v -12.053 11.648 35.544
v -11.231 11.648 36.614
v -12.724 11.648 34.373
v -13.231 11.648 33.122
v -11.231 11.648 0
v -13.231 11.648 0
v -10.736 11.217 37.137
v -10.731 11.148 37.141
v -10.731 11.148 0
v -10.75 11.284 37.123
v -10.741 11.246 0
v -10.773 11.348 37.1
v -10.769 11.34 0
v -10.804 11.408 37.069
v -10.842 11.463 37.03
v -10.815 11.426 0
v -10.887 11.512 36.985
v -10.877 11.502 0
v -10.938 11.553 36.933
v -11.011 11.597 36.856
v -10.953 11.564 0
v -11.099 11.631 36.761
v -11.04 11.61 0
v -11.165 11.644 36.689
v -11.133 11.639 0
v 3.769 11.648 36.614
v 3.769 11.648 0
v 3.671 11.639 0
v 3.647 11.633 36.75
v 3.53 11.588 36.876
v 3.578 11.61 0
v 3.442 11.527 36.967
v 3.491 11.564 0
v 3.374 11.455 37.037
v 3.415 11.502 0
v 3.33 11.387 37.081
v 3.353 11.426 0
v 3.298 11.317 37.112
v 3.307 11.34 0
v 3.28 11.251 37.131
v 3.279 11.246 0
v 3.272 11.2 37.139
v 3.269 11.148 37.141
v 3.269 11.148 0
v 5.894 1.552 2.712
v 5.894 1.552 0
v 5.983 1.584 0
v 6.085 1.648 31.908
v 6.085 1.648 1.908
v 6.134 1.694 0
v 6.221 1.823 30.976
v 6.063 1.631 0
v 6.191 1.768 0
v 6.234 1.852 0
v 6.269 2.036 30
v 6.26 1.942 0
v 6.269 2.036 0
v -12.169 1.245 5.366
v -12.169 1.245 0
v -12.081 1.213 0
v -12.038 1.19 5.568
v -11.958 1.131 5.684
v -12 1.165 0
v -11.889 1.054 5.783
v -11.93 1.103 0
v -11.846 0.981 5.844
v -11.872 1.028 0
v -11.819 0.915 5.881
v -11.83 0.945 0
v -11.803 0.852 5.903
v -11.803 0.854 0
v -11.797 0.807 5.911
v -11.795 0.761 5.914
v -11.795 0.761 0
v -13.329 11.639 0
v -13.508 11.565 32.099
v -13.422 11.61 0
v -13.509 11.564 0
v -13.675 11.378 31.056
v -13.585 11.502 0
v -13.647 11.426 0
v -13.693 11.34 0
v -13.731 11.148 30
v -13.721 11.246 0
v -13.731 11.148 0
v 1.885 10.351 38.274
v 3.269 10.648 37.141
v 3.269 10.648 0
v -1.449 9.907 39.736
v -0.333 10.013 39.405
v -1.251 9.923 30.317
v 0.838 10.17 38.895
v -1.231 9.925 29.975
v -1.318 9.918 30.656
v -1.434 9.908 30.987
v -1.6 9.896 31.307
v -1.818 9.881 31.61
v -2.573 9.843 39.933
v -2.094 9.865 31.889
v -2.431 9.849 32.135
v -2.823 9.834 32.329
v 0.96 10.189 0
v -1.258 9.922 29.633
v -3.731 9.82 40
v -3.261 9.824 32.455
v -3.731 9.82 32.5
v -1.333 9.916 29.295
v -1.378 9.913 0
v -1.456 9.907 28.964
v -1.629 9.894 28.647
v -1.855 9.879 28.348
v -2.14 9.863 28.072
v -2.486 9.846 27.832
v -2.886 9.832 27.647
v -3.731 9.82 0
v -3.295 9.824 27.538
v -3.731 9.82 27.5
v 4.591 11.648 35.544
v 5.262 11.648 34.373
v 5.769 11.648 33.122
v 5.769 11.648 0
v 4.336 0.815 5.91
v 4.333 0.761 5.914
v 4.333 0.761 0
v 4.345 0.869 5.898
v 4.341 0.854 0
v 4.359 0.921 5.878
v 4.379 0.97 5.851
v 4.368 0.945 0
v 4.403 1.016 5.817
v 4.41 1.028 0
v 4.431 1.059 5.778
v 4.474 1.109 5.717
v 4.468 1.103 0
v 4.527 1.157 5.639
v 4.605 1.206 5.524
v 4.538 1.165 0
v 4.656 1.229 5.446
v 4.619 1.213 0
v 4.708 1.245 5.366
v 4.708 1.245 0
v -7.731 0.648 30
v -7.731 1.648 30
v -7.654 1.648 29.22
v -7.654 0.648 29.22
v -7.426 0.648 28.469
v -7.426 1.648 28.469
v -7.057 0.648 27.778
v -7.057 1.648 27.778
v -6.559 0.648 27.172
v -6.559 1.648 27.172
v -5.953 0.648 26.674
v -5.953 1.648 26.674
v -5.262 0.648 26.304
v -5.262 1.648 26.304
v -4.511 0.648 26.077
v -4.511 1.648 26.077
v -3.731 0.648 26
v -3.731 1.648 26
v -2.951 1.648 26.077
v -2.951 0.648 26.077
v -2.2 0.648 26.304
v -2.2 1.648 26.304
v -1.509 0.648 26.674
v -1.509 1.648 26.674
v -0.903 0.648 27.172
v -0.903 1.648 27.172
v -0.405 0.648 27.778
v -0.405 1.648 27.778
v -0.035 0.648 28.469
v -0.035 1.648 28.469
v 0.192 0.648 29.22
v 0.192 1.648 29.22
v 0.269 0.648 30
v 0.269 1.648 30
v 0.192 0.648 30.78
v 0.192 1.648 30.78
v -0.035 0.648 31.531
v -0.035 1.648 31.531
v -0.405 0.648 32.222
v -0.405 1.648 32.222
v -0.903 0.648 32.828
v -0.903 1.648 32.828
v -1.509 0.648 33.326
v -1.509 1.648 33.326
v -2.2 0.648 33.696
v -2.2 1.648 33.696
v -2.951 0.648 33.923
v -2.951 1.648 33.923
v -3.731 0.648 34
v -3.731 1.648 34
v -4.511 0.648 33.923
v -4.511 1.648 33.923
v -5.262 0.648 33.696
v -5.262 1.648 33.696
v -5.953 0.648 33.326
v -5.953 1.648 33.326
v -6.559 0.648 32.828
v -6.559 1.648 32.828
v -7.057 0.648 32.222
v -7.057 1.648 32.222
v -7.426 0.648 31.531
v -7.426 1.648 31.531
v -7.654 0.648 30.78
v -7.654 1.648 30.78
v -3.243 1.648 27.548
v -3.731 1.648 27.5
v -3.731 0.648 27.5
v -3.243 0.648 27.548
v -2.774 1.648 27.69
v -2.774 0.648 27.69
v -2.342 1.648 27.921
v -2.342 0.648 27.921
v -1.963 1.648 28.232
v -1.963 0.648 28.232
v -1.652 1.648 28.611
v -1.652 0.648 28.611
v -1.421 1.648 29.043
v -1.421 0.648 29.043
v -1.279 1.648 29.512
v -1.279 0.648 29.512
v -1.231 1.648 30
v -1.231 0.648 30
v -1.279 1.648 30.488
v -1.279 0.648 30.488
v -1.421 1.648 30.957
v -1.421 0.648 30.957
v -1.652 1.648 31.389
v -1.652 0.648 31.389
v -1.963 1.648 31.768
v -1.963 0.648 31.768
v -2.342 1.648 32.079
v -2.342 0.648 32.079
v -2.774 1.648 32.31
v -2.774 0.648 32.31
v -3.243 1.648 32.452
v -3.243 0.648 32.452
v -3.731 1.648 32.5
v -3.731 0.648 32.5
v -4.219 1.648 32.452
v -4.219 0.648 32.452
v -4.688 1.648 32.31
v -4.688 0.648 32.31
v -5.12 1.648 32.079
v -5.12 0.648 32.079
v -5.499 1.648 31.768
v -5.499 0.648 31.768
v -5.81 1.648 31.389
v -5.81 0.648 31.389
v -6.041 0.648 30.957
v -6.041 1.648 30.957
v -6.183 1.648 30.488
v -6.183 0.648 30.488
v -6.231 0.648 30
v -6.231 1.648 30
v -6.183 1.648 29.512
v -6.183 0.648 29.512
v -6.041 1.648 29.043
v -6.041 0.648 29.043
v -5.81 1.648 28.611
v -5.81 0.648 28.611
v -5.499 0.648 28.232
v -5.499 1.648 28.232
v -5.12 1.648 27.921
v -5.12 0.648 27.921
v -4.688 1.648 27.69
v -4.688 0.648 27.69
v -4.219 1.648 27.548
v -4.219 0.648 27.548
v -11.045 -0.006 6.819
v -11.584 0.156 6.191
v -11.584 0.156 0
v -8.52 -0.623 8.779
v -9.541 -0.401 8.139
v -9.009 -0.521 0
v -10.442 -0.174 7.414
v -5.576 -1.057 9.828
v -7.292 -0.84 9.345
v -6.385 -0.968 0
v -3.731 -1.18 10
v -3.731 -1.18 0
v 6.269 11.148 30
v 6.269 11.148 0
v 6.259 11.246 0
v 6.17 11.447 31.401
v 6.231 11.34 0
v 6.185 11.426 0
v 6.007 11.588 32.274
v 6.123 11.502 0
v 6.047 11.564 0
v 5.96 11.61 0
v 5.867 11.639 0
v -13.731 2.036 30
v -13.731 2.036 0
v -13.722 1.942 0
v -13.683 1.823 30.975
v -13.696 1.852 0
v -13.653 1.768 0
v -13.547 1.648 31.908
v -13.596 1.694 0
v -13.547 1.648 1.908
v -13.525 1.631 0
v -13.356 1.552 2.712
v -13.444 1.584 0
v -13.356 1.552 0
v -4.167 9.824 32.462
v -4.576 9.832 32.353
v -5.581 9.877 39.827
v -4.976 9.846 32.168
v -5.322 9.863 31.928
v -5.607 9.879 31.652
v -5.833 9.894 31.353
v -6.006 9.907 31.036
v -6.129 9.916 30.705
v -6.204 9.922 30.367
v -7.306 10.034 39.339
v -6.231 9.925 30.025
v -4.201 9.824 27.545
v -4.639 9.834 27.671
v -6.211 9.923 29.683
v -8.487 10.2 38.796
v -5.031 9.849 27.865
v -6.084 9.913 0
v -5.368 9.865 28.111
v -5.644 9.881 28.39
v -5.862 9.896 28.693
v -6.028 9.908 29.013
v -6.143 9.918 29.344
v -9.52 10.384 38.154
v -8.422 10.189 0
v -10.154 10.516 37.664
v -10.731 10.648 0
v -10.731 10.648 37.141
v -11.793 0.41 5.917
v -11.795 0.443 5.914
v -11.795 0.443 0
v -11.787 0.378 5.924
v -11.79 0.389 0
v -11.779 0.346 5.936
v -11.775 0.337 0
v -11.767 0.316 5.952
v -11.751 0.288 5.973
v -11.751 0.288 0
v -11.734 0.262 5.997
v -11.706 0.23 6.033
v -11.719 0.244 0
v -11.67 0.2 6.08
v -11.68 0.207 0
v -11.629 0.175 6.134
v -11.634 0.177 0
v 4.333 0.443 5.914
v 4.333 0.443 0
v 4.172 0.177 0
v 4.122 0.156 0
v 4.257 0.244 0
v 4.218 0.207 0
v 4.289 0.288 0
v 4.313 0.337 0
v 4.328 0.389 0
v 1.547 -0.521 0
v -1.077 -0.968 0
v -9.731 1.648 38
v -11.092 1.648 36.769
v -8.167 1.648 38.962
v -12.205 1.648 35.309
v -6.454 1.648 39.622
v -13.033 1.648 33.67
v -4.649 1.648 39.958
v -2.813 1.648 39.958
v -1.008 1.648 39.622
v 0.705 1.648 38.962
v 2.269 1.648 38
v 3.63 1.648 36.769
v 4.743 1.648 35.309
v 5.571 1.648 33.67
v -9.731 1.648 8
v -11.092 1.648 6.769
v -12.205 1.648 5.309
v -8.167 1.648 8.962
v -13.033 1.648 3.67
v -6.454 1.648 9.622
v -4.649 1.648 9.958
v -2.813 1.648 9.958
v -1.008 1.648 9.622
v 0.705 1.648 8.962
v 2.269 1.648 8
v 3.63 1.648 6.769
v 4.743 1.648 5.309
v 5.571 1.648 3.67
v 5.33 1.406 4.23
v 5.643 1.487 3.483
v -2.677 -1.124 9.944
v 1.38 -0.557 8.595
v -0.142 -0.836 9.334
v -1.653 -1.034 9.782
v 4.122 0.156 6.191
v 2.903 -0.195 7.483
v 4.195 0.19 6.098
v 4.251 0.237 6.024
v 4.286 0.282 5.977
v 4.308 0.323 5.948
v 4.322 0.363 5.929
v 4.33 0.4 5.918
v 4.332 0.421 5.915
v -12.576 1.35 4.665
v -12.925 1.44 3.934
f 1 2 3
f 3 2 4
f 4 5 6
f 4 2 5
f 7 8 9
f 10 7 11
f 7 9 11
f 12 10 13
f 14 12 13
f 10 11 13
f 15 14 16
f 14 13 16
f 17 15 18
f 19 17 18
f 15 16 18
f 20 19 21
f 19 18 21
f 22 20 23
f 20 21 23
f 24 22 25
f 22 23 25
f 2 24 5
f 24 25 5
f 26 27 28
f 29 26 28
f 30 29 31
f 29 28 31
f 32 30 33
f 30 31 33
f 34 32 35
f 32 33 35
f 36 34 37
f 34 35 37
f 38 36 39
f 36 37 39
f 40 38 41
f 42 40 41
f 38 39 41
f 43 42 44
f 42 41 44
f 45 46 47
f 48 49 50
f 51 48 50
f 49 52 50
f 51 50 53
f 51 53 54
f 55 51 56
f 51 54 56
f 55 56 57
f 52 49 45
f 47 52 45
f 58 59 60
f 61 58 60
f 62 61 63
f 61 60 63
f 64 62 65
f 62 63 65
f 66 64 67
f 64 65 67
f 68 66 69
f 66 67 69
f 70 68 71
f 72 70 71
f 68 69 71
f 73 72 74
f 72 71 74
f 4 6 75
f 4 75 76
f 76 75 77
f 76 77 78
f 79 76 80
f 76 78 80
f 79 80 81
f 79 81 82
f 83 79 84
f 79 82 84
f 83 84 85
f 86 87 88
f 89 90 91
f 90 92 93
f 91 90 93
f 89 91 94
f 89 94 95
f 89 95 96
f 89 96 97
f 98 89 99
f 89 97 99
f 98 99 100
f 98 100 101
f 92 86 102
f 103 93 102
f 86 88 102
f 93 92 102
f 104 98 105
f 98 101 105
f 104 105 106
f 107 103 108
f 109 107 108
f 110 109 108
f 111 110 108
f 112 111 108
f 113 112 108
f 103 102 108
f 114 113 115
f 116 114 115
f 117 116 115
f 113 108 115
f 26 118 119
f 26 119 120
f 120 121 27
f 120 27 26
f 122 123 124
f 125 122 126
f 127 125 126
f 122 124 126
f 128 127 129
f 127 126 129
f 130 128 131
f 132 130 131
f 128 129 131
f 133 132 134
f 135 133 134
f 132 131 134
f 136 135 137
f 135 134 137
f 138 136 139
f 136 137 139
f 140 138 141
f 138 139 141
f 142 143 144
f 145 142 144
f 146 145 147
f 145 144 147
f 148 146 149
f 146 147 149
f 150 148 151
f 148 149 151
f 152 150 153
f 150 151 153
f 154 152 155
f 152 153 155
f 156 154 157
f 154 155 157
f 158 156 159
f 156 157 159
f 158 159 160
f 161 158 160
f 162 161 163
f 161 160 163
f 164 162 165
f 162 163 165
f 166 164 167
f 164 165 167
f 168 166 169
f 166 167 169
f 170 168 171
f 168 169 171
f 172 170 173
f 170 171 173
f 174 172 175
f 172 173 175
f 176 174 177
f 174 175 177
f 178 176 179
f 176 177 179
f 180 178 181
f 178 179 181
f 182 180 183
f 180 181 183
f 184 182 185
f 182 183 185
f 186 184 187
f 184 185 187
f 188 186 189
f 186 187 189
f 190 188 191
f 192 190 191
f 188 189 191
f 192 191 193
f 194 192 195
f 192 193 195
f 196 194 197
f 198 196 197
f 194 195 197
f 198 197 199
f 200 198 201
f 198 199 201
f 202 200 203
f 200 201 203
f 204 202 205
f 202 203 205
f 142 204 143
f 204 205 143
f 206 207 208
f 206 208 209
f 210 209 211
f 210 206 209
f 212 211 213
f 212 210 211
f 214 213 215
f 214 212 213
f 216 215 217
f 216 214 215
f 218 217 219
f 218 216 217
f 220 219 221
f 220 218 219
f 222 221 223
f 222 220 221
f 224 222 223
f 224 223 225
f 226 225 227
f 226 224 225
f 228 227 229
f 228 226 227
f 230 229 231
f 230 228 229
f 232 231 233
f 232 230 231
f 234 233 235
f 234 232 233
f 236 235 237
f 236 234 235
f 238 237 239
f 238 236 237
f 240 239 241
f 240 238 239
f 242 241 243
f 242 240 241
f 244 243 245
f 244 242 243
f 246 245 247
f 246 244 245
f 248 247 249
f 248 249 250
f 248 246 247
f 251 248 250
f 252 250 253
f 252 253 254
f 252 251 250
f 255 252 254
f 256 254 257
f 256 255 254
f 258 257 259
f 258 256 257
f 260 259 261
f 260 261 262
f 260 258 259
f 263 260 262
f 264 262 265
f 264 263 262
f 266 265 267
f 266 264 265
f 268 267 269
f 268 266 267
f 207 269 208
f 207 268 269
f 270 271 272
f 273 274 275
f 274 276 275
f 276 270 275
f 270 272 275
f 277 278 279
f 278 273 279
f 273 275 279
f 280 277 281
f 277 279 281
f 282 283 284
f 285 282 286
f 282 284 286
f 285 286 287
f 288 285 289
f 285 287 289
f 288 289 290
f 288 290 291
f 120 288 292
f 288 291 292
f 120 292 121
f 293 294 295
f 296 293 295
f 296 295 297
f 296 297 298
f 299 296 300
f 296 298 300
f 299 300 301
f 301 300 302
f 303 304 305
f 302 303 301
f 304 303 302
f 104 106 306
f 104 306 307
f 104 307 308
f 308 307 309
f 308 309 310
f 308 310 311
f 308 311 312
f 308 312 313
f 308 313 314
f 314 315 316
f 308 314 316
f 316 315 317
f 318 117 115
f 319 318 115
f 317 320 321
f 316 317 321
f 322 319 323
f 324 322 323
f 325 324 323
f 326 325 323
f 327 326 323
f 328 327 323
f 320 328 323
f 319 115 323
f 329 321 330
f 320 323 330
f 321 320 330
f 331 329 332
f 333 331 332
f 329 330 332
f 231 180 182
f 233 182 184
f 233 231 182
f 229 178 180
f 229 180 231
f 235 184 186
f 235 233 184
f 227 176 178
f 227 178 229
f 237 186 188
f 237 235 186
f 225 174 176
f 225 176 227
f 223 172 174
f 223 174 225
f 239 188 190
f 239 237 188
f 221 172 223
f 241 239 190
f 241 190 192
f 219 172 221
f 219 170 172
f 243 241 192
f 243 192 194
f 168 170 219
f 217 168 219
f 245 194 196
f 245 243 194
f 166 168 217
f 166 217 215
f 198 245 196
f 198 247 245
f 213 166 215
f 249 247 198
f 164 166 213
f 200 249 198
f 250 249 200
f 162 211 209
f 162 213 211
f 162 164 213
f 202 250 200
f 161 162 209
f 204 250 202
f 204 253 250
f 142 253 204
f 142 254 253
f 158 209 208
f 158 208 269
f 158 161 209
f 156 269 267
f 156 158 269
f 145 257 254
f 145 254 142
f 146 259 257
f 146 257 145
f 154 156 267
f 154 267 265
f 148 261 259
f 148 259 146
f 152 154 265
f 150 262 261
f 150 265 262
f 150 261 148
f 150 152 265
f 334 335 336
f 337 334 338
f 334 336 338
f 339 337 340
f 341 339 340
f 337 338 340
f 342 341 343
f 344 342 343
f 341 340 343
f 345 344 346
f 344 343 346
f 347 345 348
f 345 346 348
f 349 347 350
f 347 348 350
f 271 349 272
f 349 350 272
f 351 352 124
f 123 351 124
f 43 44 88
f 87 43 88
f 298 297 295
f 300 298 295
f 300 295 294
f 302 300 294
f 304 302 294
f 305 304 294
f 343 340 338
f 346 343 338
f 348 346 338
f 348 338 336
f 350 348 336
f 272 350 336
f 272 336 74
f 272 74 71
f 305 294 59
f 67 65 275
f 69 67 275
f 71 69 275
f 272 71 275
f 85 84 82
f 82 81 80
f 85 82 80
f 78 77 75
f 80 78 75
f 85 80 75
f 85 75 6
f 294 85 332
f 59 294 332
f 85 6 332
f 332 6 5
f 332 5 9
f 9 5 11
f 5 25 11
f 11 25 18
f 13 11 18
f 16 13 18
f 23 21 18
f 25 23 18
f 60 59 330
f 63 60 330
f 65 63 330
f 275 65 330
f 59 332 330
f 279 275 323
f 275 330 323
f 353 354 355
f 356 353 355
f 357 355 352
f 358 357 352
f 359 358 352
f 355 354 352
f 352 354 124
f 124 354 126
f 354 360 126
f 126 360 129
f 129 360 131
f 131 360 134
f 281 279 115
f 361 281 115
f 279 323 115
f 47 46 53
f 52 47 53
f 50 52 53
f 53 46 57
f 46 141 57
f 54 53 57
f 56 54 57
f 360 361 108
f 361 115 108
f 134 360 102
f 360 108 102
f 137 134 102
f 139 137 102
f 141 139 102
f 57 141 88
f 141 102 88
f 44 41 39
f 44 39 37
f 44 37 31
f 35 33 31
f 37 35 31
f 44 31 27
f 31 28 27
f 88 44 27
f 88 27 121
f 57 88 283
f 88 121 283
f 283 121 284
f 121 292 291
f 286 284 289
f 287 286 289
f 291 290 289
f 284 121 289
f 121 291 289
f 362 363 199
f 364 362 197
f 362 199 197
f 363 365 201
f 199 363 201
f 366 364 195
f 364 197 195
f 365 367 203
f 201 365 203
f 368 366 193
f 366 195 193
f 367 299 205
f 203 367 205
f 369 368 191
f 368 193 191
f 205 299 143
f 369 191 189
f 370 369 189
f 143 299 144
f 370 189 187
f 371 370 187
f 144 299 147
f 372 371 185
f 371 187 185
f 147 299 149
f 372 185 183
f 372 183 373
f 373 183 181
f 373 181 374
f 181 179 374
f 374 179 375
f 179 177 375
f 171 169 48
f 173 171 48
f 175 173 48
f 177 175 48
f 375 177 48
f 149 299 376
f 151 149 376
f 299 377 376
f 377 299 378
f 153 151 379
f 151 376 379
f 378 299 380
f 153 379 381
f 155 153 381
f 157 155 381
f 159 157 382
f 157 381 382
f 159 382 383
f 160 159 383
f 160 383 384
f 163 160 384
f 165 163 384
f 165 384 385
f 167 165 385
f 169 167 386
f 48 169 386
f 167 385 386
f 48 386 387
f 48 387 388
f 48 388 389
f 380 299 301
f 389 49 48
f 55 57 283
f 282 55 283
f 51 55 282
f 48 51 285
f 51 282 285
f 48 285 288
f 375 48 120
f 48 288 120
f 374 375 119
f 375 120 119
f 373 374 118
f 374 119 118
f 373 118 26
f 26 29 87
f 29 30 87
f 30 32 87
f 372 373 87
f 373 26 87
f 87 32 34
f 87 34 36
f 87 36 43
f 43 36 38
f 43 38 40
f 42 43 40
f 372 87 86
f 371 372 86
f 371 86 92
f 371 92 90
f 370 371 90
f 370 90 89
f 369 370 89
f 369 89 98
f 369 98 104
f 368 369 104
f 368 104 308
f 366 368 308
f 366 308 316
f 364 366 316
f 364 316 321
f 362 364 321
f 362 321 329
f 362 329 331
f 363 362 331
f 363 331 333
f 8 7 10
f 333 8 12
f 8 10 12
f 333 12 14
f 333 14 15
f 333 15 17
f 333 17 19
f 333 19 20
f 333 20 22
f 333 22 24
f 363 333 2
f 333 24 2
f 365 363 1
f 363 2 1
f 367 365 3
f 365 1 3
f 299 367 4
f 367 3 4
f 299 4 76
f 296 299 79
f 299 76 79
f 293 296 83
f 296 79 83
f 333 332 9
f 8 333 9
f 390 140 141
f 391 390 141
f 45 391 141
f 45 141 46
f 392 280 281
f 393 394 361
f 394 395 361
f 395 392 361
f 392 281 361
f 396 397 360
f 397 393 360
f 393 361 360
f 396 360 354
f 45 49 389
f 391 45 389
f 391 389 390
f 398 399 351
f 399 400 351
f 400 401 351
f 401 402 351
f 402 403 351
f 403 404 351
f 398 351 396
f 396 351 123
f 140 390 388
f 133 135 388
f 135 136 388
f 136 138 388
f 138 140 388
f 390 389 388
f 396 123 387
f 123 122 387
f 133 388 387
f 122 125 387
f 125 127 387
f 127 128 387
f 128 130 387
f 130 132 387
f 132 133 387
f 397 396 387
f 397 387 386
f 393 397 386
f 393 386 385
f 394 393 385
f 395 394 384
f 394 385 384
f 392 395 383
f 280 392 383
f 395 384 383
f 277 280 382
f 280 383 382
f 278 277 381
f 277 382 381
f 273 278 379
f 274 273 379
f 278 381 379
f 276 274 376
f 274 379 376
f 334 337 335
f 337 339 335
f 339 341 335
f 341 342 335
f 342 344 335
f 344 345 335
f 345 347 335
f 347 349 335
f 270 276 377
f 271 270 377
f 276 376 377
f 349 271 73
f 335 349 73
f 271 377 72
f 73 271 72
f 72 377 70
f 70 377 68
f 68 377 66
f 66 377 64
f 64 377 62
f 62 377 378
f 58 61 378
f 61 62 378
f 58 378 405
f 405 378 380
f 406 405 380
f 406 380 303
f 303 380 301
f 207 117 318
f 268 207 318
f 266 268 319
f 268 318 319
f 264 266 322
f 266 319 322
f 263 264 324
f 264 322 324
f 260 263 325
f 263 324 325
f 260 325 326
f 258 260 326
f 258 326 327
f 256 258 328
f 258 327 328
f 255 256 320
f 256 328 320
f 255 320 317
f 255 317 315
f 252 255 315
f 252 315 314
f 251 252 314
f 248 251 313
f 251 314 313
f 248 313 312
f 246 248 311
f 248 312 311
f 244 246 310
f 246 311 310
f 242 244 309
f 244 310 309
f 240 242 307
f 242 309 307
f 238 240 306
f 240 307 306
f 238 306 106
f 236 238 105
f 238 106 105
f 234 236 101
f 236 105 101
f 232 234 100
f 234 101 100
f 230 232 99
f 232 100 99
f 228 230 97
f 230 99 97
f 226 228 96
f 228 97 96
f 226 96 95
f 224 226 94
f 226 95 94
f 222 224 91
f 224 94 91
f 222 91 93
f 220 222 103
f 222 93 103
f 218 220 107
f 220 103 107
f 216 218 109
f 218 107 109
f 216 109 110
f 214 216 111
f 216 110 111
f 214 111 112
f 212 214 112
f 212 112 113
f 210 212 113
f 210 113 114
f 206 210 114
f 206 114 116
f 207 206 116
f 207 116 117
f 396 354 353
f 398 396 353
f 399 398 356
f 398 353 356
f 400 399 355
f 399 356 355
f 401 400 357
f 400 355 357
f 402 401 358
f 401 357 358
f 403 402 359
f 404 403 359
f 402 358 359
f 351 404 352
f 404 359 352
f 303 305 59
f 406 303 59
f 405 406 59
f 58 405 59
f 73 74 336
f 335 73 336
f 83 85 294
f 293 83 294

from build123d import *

# Parameters (mm, degrees)
SALIENTE_EXTRUIR1_DEPTH = 40
CROQUIS2_R              = 2.5
CORTAR_EXTRUIR1_DEPTH   = 22.5
CORTAR_EXTRUIR5_DEPTH   = 14
CROQUIS6_R              = 4
CROQUIS6_R_2            = 2.5
SALIENTE_EXTRUIR2_DEPTH = 1


with BuildPart() as part:
    # Croquis1 → Saliente-Extruir1 (new body)
    with BuildSketch(Plane.XY):
        with BuildLine():
            ThreePointArc((-13.23096405, 11.648445498), (-13.584517441, 11.501998889), (-13.73096405, 11.148445498))
            Line((-13.73096405, 11.148445498), (-13.73096405, 2.035658412))
            ThreePointArc((-13.73096405, 2.035658412), (-13.626281451, 1.729514406), (-13.356067441, 1.551562201))
            Line((-13.356067441, 1.551562201), (-12.169475815, 1.244915231))
            ThreePointArc((-12.169475815, 1.244915231), (-11.899261805, 1.066963026), (-11.794579206, 0.76081902))
            Line((-11.794579206, 0.76081902), (-11.794579206, 0.442917518))
            ThreePointArc((-11.794579206, 0.442917518), (-11.736179814, 0.265071669), (-11.583718232, 0.156466416))
            ThreePointArc((-11.583718232, 0.156466416), (-7.701884055, -0.773383829), (-3.73096405, -1.17965021))
            ThreePointArc((-3.73096405, -1.17965021), (0.239955955, -0.773383829), (4.121790132, 0.156466416))
            ThreePointArc((4.121790132, 0.156466416), (4.274251714, 0.265071669), (4.332651106, 0.442917518))
            Line((4.332651106, 0.442917518), (4.332651106, 0.76081902))
            ThreePointArc((4.332651106, 0.76081902), (4.437333704, 1.066963026), (4.707547715, 1.244915231))
            Line((4.707547715, 1.244915231), (5.894139341, 1.551562201))
            ThreePointArc((5.894139341, 1.551562201), (6.164353351, 1.729514406), (6.26903595, 2.035658412))
            Line((6.26903595, 2.035658412), (6.26903595, 11.148445498))
            ThreePointArc((6.26903595, 11.148445498), (6.12258934, 11.501998889), (5.76903595, 11.648445498))
            Line((5.76903595, 11.648445498), (3.76903595, 11.648445498))
            ThreePointArc((3.76903595, 11.648445498), (3.415482559, 11.501998889), (3.26903595, 11.148445498))
            Line((3.26903595, 11.148445498), (3.26903595, 10.648445498))
            ThreePointArc((3.26903595, 10.648445498), (-0.206558338, 10.028093004), (-3.73096405, 9.82034979))
            ThreePointArc((-3.73096405, 9.82034979), (-7.255369763, 10.028093004), (-10.73096405, 10.648445498))
            Line((-10.73096405, 10.648445498), (-10.73096405, 11.148445498))
            ThreePointArc((-10.73096405, 11.148445498), (-10.87741066, 11.501998889), (-11.23096405, 11.648445498))
            Line((-11.23096405, 11.648445498), (-13.23096405, 11.648445498))
        make_face()
    extrude(amount=SALIENTE_EXTRUIR1_DEPTH)

    # Croquis2 → Cortar-Extruir1 (cut, symmetric)
    with BuildSketch(Plane(origin=(0, 0, 0), x_dir=(1, 0, 0), z_dir=(0, 1, 0))):
        with Locations(Location((-3.73096405, -30, 0), (0, 0, 90))):
            Circle(CROQUIS2_R)
        with BuildLine():
            Line((-13.73096405, -30), (-13.73096405, -43.289358514))
            Line((-13.73096405, -43.289358514), (6.26903595, -43.289358514))
            Line((6.26903595, -43.289358514), (6.26903595, -30))
            ThreePointArc((6.26903595, -30), (-3.73096405, -40), (-13.73096405, -30))
        make_face()
    extrude(amount=CORTAR_EXTRUIR1_DEPTH, both=True, mode=Mode.SUBTRACT)

    # Croquis5 → Cortar-Extruir5 (cut)
    with BuildSketch(Plane(origin=(0, 1.648445498, 0), x_dir=(1, 0, 0), z_dir=(0, 1, 0))):
        with BuildLine():
            Line((-13.73096405, 0), (-13.73096405, -40.777418578))
            Line((-13.73096405, -40.777418578), (6.26903595, -40.777418578))
            Line((6.26903595, -40.777418578), (6.26903595, 0))
            ThreePointArc((6.26903595, 0), (-3.73096405, -10), (-13.73096405, 0))
        make_face()
    extrude(amount=-CORTAR_EXTRUIR5_DEPTH, mode=Mode.SUBTRACT)

    # Croquis6 → Saliente-Extruir2 (add)
    with BuildSketch(Plane.XZ.offset(-1.648445498)):
        with Locations(Location((-3.73096405, 30, 0), (0, 0, 180))):
            Circle(CROQUIS6_R)
        with Locations(Location((-3.73096405, 30, 0), (0, 0, 270))):
            Circle(CROQUIS6_R_2, mode=Mode.SUBTRACT)
    extrude(amount=SALIENTE_EXTRUIR2_DEPTH)


solid = part.part
